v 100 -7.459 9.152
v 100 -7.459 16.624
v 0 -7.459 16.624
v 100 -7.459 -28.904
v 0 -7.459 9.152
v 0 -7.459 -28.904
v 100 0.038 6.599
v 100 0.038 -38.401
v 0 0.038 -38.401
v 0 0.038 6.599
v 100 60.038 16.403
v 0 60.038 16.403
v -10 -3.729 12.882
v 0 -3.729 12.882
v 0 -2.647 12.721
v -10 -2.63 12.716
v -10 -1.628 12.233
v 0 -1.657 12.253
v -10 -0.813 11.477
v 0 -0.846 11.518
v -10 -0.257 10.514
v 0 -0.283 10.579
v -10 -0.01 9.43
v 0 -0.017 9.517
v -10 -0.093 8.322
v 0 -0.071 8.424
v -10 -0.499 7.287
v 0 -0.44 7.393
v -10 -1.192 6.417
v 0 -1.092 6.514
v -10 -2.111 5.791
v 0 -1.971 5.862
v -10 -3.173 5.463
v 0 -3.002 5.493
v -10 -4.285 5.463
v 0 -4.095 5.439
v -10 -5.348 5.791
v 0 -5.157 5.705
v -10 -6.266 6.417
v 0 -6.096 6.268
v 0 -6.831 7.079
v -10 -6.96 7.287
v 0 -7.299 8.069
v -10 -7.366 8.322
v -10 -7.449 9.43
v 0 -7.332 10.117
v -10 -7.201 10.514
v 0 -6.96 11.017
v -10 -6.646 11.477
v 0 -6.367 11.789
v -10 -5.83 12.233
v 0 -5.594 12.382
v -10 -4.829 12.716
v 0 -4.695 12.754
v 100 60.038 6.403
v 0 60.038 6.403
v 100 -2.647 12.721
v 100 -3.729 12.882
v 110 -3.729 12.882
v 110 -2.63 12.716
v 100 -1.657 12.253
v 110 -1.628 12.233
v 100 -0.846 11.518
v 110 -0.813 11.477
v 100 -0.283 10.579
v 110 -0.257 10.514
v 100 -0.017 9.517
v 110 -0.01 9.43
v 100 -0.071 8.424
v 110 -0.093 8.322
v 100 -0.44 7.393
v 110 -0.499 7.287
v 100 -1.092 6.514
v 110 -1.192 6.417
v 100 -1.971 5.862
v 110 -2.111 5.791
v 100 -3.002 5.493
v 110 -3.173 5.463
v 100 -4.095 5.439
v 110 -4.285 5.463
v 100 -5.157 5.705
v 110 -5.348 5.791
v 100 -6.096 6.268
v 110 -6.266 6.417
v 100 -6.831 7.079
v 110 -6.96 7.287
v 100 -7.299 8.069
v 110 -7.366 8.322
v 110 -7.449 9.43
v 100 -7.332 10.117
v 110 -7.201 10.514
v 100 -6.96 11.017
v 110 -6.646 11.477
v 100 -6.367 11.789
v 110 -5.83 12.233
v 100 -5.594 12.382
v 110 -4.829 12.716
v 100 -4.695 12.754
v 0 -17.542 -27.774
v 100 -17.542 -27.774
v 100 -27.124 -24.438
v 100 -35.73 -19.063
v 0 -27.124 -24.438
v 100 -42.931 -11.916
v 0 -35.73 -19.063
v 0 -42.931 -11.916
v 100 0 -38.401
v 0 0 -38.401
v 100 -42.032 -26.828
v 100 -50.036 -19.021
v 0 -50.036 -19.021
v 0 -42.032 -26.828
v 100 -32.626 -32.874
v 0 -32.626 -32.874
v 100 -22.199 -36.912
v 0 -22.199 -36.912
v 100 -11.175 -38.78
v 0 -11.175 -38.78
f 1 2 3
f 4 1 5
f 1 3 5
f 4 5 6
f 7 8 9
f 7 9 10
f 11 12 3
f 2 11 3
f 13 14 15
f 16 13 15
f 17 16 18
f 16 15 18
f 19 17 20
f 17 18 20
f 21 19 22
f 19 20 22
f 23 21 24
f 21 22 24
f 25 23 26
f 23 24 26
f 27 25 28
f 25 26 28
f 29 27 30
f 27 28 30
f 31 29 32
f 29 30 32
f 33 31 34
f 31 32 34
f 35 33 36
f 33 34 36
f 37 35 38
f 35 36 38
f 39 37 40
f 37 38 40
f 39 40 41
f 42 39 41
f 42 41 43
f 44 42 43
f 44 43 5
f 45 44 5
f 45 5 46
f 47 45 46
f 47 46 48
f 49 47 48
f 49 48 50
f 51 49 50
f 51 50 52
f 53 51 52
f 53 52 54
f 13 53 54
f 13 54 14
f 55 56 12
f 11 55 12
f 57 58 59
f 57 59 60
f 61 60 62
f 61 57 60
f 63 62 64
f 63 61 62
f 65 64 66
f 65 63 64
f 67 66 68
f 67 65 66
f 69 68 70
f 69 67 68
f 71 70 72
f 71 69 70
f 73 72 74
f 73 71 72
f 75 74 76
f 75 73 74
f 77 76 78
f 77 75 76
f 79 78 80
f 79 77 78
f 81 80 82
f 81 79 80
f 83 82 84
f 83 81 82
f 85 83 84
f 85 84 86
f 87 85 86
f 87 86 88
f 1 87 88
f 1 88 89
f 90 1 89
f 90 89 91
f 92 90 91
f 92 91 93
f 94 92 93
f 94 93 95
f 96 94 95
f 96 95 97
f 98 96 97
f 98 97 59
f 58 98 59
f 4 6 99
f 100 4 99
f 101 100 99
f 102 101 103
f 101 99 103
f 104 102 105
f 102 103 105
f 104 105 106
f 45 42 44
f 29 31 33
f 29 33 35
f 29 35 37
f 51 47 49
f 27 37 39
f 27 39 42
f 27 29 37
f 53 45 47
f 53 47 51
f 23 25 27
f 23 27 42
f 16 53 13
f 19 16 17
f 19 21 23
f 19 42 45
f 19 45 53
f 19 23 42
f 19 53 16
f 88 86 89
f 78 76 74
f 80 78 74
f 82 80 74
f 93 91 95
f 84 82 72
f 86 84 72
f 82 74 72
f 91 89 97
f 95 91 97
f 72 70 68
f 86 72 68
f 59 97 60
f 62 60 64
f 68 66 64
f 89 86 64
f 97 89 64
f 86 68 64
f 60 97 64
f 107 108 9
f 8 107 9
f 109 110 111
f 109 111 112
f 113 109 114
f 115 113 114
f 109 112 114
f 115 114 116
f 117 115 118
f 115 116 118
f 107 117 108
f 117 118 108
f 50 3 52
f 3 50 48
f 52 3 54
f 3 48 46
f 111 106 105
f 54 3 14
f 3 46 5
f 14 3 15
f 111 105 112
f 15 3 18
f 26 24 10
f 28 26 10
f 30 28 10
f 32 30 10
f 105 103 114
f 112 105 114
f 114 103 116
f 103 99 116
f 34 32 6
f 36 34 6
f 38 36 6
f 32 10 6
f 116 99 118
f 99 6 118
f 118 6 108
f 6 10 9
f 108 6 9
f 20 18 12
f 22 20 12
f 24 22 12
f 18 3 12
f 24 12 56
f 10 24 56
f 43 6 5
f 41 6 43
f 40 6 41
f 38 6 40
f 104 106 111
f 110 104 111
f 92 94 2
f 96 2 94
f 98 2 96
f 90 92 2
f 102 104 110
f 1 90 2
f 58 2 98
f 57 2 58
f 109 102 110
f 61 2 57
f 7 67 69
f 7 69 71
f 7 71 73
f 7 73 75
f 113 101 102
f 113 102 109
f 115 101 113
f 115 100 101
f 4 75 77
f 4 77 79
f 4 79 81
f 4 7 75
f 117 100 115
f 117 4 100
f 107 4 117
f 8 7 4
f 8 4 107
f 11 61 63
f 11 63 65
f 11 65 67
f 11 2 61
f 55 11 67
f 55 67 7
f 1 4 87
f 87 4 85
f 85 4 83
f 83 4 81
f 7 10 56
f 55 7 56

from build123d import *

# Parameters (mm, degrees)
BOSS_EXTRU_1_DEPTH      = 100
ESQUISSE3_R             = 3.73
BOSS_EXTRU_2_DEPTH      = 10
BOSS_EXTRU_2_DEPTH_BACK = 110


with BuildPart() as part:
    # Esquisse1 → Boss.-Extru.1 (new body)
    with BuildSketch(Plane(origin=(0, 0, 0), x_dir=(0, 0, -1), z_dir=(1, 0, 0))):
        with BuildLine():
            Line((11.916237197, -42.931206961), (19.021149864, -50.036119628))
            ThreePointArc((19.021149864, -50.036119628), (35.155991103, -27.514297721), (38.400830806, 0))
            Line((38.400830806, 0), (38.400830806, 0.038210025))
            Line((38.400830806, 0.038210025), (-6.599169194, 0.038210025))
            Line((-6.599169194, 0.038210025), (-6.402631947, 60.038210025))
            Line((-6.402631947, 60.038210025), (-16.402685595, 60.038210025))
            Line((-16.402685595, 60.038210025), (-16.623781762, -7.459275773))
            Line((-16.623781762, -7.459275773), (28.904128187, -7.459275773))
            ThreePointArc((28.904128187, -7.459275773), (24.438110532, -27.124259516), (11.916237197, -42.931206961))
        make_face()
    extrude(amount=BOSS_EXTRU_1_DEPTH)

    # Esquisse3 → Boss.-Extru.2 (add, two sides)
    with BuildSketch(Plane.ZY) as boss_extru_2_sk:
        with Locations((9.151523675, -3.729275773)):
            Circle(ESQUISSE3_R)
    extrude(amount=BOSS_EXTRU_2_DEPTH)
    extrude(boss_extru_2_sk.sketch, amount=-BOSS_EXTRU_2_DEPTH_BACK)


solid = part.part
